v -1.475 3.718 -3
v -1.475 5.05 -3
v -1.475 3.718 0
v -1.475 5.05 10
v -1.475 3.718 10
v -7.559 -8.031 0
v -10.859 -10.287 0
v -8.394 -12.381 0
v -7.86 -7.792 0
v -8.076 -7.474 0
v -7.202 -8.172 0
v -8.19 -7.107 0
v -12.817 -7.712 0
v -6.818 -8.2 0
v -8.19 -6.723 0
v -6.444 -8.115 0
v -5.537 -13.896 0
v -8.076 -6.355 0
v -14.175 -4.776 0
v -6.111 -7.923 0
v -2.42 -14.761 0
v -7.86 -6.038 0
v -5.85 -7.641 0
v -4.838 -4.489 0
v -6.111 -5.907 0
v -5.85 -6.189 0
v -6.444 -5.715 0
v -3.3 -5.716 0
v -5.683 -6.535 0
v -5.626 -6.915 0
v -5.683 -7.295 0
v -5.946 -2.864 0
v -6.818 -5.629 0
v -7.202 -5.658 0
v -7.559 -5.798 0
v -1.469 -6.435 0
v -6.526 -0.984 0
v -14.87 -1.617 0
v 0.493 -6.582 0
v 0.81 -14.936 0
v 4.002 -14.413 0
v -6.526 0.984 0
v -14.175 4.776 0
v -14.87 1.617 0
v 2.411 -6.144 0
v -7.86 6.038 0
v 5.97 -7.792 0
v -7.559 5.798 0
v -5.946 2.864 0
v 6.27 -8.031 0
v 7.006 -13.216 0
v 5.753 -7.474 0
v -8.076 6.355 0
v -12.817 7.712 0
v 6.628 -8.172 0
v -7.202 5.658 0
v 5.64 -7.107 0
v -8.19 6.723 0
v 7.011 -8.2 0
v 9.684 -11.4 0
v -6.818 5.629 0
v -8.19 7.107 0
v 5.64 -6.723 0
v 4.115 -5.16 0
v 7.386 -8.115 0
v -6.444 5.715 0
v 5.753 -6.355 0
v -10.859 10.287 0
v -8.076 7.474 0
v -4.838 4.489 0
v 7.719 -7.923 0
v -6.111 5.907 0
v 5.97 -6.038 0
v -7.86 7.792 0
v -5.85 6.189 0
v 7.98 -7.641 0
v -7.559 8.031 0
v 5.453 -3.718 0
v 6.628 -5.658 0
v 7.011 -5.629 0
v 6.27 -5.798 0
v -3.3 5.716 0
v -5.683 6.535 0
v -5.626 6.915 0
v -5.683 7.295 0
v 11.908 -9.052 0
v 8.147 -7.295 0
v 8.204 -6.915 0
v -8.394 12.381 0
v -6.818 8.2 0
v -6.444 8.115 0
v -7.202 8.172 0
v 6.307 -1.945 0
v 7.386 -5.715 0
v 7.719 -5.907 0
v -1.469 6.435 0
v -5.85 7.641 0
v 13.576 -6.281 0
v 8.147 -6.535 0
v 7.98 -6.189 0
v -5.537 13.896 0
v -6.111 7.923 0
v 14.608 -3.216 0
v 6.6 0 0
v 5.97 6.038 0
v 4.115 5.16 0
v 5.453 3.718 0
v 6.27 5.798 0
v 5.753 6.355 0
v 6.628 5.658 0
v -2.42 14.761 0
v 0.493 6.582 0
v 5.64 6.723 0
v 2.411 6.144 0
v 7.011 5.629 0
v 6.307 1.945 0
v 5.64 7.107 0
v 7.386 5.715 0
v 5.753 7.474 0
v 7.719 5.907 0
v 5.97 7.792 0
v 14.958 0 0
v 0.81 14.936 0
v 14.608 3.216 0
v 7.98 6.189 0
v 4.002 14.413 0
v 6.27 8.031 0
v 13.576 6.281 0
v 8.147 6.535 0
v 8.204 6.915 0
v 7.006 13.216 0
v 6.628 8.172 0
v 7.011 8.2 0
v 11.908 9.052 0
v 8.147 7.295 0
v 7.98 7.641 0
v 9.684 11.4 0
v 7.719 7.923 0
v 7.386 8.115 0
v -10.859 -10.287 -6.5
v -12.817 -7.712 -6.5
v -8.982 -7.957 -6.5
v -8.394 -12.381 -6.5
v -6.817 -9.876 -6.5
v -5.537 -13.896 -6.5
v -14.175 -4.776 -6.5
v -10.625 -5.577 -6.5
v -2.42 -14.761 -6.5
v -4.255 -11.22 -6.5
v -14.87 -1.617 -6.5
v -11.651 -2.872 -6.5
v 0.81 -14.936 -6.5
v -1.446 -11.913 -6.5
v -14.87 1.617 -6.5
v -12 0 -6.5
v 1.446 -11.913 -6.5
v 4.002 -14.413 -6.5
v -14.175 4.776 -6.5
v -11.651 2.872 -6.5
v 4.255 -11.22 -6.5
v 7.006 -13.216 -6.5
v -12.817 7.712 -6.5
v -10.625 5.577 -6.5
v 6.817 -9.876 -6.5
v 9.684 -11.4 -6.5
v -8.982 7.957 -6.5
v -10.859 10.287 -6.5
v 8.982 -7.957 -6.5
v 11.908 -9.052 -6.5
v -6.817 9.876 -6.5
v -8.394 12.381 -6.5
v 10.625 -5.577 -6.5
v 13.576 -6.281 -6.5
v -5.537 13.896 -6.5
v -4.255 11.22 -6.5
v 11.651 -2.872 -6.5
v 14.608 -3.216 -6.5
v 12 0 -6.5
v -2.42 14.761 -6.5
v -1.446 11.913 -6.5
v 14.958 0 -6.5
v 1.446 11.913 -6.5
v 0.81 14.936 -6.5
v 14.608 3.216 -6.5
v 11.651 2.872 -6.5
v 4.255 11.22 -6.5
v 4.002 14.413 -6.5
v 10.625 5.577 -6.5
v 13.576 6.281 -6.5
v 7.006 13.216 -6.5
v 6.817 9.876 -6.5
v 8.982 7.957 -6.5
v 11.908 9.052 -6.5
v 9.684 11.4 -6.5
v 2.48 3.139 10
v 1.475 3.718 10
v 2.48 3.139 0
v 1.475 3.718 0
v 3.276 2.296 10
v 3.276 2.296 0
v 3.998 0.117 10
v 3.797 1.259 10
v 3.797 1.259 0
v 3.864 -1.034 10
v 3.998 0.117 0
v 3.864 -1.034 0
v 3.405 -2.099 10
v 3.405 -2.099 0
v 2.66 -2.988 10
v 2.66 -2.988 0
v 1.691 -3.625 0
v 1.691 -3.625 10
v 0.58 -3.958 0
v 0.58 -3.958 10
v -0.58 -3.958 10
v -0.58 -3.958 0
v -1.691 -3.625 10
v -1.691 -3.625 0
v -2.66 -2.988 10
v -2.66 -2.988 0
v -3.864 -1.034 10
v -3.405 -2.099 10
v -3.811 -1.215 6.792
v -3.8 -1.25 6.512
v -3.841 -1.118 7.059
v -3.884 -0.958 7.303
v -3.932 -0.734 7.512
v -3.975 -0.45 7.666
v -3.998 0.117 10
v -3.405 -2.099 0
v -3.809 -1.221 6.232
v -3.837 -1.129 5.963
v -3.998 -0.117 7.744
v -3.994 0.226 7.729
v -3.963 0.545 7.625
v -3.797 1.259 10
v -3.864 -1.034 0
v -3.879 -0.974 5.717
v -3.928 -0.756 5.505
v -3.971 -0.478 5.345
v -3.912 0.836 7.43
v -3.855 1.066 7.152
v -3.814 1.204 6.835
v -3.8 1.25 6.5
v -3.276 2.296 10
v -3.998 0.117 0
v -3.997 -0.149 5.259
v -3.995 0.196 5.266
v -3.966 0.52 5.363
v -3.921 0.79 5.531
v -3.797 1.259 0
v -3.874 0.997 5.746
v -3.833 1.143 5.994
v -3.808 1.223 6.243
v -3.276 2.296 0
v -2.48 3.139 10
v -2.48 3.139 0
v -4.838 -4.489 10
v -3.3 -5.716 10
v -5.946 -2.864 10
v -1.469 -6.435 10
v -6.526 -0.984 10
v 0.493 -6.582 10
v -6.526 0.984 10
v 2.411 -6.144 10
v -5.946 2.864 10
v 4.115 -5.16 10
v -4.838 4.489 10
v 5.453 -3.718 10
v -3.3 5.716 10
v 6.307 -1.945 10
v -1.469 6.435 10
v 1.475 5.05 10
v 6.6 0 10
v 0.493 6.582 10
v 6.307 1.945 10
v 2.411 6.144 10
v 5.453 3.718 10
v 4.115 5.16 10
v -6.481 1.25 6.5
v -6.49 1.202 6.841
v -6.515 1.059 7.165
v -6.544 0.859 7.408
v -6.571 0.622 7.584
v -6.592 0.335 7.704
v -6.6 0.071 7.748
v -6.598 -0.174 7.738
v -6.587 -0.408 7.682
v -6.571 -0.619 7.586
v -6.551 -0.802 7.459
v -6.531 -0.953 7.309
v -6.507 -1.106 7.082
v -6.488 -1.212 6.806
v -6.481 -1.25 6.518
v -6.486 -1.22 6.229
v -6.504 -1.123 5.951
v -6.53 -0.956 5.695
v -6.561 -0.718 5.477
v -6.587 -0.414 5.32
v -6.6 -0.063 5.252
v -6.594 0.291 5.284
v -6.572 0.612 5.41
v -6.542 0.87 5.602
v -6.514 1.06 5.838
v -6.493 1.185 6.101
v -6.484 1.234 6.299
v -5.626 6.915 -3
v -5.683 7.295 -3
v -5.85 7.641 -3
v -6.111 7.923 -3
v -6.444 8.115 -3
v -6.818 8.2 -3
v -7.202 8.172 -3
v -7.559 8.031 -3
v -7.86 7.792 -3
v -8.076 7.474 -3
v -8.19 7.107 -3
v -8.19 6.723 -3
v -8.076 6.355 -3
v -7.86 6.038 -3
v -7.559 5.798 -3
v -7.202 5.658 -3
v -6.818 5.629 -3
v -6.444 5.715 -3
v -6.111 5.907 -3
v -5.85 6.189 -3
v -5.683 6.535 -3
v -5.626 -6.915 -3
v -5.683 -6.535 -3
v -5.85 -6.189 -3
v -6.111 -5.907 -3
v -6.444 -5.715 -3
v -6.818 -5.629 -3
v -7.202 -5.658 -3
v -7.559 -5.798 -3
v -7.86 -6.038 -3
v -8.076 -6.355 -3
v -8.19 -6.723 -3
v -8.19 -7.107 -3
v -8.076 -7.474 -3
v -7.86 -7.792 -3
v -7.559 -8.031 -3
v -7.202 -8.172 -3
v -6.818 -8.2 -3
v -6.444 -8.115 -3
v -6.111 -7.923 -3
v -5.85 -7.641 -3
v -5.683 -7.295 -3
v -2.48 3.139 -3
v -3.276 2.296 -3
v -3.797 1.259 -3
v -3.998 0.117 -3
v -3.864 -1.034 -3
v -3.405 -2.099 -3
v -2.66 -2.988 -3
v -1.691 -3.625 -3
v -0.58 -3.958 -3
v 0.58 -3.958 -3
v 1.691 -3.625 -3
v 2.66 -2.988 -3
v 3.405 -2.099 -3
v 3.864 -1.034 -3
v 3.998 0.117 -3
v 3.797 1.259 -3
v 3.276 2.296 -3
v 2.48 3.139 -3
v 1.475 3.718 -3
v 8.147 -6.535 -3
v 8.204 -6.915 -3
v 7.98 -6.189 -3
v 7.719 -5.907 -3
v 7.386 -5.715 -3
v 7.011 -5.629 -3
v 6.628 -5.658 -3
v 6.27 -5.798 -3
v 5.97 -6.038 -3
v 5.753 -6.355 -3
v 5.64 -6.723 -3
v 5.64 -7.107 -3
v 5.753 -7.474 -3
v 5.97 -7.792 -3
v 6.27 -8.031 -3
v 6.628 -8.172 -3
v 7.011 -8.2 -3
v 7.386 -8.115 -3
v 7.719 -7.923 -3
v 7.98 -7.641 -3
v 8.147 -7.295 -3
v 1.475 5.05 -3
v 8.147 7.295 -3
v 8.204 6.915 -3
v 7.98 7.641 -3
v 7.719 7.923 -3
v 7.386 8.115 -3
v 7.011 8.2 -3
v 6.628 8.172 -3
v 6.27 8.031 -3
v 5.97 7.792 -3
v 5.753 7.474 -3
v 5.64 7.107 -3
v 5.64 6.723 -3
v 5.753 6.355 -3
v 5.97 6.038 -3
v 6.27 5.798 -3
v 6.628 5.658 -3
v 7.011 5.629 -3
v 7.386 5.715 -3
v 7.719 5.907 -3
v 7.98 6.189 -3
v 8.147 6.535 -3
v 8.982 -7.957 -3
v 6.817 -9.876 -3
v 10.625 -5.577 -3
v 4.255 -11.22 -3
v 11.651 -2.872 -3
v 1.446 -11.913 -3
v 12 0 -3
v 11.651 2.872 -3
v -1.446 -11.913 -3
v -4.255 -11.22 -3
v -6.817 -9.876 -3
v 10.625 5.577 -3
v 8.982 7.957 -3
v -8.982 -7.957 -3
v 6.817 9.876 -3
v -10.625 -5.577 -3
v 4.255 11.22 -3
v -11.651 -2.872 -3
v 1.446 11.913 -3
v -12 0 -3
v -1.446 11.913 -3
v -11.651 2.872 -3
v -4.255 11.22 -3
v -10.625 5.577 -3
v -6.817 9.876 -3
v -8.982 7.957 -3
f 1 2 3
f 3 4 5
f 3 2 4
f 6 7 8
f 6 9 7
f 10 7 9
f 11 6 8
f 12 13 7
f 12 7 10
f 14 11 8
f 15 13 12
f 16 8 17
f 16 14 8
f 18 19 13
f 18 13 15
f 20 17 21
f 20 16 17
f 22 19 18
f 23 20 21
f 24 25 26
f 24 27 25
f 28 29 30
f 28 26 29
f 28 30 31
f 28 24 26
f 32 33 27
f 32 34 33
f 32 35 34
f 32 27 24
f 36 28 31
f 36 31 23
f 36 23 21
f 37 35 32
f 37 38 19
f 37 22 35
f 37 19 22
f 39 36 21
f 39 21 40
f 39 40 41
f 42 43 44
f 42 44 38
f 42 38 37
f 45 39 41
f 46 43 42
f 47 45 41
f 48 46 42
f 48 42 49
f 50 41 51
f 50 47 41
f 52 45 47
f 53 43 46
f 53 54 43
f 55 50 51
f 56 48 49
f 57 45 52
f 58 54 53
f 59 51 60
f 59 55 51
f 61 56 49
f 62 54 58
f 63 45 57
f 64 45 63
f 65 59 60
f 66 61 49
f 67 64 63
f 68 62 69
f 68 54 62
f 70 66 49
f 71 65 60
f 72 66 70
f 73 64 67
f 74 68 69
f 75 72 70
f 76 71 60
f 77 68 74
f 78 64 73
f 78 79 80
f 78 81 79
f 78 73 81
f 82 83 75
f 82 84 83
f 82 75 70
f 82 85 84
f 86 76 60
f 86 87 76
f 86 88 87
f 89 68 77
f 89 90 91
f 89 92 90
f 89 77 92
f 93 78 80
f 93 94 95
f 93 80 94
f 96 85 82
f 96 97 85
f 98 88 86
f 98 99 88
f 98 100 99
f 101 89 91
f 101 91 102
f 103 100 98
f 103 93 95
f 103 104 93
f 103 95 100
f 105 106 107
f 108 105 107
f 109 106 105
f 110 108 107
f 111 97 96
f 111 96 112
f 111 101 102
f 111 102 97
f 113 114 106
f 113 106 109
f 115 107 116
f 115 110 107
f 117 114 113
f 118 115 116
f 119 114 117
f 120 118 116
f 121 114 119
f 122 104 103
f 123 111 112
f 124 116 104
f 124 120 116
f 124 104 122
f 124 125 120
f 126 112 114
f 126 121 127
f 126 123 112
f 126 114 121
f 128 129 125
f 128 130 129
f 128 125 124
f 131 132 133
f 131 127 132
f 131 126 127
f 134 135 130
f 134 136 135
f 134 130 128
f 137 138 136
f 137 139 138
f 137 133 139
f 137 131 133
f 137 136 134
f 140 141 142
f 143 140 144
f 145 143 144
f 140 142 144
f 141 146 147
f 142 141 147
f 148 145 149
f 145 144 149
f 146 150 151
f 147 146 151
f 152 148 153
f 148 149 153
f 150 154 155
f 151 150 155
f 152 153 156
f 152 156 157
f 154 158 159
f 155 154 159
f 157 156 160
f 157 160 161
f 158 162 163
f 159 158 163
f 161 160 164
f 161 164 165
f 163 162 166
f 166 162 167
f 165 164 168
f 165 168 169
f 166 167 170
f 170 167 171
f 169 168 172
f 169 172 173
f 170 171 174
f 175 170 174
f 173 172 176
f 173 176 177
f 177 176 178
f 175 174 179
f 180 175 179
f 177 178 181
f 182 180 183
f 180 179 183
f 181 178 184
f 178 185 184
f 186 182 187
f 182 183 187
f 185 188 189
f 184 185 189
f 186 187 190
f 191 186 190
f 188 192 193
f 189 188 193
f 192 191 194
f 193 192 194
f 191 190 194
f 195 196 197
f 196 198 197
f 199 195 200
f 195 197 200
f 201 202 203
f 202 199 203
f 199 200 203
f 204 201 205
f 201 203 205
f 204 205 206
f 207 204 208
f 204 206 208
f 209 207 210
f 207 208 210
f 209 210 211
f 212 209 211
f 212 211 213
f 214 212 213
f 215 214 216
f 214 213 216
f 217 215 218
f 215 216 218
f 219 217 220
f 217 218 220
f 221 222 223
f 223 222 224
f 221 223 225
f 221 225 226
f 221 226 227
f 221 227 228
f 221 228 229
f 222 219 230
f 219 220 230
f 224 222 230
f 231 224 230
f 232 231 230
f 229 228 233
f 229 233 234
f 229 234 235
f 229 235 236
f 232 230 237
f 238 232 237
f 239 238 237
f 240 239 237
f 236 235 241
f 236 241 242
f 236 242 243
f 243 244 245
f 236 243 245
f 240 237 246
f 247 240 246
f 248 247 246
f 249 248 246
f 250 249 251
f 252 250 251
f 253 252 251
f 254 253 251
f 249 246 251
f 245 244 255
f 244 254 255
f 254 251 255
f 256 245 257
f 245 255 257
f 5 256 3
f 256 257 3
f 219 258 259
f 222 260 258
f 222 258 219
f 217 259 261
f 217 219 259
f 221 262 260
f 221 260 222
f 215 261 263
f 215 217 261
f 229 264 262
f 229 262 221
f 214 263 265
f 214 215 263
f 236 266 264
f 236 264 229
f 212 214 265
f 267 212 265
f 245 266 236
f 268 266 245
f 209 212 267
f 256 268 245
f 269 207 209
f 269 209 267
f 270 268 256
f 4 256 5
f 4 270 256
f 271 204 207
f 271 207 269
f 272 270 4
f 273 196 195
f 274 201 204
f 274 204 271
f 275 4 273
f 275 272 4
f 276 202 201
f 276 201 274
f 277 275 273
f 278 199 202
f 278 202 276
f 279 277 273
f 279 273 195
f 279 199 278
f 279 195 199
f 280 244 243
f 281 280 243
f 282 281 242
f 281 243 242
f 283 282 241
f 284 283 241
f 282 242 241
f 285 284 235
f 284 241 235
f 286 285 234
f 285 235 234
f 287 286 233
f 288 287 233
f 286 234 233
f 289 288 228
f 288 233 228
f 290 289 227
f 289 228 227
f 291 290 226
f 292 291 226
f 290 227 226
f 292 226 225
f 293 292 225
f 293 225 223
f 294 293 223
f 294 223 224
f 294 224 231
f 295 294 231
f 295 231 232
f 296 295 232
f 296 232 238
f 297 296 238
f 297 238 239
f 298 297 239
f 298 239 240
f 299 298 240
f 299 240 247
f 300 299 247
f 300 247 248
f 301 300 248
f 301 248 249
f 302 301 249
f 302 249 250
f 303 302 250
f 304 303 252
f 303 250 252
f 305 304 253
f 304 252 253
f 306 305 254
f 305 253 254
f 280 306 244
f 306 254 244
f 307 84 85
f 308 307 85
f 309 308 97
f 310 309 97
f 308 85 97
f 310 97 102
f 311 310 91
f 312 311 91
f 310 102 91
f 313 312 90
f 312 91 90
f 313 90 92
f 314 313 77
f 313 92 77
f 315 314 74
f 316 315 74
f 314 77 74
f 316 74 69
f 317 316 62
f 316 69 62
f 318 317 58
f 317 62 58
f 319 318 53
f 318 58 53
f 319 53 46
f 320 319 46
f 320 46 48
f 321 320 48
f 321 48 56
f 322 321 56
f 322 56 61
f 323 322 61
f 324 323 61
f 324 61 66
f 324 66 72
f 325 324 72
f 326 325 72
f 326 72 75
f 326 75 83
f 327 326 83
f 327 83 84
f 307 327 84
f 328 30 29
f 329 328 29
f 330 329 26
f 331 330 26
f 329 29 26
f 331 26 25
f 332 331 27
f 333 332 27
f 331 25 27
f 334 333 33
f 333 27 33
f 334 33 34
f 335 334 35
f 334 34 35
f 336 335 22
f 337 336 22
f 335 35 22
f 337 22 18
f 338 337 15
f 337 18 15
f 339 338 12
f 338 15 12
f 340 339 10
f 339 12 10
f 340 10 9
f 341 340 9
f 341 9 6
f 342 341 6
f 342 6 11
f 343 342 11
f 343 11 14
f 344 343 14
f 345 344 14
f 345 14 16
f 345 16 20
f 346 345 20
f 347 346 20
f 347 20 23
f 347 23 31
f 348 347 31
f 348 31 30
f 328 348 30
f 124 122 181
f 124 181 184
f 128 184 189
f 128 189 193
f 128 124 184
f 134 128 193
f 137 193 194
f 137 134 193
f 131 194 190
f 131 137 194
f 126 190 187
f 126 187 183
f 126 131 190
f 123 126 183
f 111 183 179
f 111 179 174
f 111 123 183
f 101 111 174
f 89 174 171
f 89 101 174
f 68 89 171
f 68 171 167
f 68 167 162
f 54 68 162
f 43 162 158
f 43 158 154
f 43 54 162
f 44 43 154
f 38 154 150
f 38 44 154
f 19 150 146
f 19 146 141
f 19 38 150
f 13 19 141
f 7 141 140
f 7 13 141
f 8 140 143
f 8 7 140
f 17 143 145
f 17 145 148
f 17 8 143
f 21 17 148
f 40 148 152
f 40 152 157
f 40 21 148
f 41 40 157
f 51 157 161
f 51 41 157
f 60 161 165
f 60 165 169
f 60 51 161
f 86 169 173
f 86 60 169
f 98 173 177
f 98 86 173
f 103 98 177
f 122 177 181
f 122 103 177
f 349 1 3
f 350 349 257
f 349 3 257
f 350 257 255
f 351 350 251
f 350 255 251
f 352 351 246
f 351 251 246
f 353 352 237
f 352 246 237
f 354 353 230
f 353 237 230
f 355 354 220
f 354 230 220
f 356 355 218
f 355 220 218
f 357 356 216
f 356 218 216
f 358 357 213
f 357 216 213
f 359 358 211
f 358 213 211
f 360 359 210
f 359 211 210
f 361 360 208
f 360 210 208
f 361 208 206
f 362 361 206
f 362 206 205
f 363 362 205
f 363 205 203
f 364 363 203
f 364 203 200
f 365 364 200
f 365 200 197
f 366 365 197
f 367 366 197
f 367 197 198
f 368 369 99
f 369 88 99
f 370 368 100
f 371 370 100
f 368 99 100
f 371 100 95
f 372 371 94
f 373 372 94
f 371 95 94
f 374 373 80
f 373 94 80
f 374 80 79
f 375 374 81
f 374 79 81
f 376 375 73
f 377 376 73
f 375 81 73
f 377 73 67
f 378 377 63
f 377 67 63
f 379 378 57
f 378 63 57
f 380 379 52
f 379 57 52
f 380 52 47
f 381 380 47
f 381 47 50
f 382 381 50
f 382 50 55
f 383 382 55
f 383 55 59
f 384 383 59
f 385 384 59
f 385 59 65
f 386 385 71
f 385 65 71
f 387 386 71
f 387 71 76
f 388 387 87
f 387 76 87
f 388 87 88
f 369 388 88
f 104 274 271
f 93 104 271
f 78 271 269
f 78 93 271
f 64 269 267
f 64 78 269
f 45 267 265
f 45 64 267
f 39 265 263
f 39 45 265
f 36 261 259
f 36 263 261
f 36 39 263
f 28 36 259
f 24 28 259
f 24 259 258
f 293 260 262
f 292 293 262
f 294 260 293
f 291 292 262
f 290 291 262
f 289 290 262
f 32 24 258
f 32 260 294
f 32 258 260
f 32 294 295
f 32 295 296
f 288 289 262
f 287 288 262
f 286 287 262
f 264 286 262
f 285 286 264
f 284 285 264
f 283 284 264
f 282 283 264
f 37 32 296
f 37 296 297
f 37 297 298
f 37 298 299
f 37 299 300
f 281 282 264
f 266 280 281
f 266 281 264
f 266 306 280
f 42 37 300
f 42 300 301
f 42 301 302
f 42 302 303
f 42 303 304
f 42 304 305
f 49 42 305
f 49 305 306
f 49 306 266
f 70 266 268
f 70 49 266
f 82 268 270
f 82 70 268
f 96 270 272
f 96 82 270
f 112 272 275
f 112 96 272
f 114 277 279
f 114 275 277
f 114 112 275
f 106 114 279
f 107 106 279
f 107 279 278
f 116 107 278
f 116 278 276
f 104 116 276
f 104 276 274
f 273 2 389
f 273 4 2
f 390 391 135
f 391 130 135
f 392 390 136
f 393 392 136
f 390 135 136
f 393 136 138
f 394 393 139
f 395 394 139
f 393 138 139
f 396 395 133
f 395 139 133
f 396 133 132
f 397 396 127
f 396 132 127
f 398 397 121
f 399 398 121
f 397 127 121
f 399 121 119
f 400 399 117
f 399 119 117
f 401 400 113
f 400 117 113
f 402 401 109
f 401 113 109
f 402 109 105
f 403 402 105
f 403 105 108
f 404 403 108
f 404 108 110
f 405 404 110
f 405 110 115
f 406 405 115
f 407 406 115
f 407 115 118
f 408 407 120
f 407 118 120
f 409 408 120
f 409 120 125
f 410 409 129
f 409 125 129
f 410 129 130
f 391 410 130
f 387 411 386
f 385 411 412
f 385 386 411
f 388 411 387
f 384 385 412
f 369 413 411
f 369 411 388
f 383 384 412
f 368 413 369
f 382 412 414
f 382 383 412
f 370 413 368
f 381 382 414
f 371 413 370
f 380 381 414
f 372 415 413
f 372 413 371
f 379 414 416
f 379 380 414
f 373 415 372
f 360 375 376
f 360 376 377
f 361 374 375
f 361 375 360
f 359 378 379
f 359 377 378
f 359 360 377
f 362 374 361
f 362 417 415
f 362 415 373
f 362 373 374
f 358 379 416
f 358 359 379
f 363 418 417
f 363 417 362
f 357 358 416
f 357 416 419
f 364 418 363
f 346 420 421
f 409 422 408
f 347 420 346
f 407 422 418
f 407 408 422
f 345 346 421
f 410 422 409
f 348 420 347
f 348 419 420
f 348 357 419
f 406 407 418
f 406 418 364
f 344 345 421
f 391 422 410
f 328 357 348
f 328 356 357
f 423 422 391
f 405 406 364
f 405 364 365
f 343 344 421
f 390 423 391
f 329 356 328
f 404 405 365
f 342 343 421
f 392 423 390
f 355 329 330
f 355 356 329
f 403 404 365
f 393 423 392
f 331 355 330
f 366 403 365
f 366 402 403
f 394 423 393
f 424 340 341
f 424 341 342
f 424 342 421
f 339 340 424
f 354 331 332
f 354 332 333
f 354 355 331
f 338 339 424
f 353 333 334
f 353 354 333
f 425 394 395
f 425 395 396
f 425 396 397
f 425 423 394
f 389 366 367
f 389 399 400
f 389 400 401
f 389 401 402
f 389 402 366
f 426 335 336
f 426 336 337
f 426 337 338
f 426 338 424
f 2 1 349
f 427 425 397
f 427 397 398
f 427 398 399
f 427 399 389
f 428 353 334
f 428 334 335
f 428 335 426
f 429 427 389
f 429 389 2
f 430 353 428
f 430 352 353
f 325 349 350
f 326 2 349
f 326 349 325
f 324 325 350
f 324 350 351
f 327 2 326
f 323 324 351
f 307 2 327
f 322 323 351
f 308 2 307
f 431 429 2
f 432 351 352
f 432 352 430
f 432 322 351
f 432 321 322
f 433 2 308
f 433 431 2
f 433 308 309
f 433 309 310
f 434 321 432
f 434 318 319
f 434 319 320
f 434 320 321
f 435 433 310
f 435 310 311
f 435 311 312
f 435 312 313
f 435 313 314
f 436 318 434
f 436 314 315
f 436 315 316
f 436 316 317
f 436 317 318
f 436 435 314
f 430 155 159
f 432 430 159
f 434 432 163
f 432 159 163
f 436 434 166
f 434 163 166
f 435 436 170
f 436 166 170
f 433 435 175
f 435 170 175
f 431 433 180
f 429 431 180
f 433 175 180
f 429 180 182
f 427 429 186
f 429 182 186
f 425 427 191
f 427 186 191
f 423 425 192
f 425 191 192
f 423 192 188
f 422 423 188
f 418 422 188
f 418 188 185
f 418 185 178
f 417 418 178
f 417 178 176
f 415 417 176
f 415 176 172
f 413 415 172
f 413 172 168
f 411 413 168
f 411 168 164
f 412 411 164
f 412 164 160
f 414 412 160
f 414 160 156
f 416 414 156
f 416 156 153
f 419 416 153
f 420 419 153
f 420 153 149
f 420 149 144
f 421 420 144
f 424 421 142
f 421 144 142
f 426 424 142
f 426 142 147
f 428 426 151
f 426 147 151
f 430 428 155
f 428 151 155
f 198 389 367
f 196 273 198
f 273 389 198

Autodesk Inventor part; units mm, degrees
ref_plane "YZ Plane" through (0, 0, 0) normal (1, 0, 0) x (0, 1, 0)
ref_plane "XZ Plane" through (0, 0, 0) normal (0, 1, 0) x (-1, 0, 0)
ref_plane "XY Plane" through (0, 0, 0) normal (0, 0, 1) x (1, 0, 0)
sketch "Sketch1" plane through (0, 0, 0) normal (0, 0, 1) x (1, 0, 0)
  circle A0 centre (0, 0) radius 6.6 construction
  circle A1 centre (-6.9148, 6.9148) radius 1.5875 construction
  circle A2 centre (6.9148, 6.9148) radius 1.5875 construction
  circle A3 centre (-6.9148, -6.9148) radius 1.5875 construction
  circle A4 centre (6.9148, -6.9148) radius 1.5875 construction
  line L0 (-6.9148, 6.9148) -> (6.9148, 6.9148) construction
  line L1 (6.9148, 6.9148) -> (6.9148, -6.9148) construction
  line L2 (6.9148, -6.9148) -> (-6.9148, -6.9148) construction
  line L3 (-6.9148, -6.9148) -> (-6.9148, 6.9148) construction
  circle A5 centre (0, 0) radius 12.958 construction
  line L4 (-6.9148, -6.9148) -> (6.9148, 6.9148) construction
  line L5 (-6.9148, 6.9148) -> (-5.7923, 5.7923) construction
  line L6 (-5.7923, 5.7923) -> (-4.6669, 4.6669) construction
  line L7 (-8.0373, 8.0373) -> (-9.1627, 9.1627) construction
  circle A6 centre (0, 0) radius 4
  line L8 (0, 4) -> (0, 5.05) construction
  line L9 (0, -20.9412) -> (0, 20.9412) construction
  line L10 (-1.475, 5.05) -> (1.475, 5.05)
  line L11 (-1.475, 5.05) -> (-1.475, 3.7181)
  line L12 (1.475, 5.05) -> (1.475, 3.7181)
  circle A7 centre (0, 0) radius 14.958
  circle A8 centre (6.9148, 6.9148) radius 1.2891
  circle A9 centre (6.9148, -6.9148) radius 1.2891
  circle A10 centre (-6.9148, -6.9148) radius 1.2891
  circle A11 centre (-6.9148, 6.9148) radius 1.2891
  dimension "d0" = 13.2
  dimension "d1" = 3.175
  dimension "d5" = 13.8296
  dimension "d6" = 45
  dimension "d9" = 8
  dimension "d10" = 1.05
  dimension "d11" = 2.95
  dimension "d14" = 2
  dimension "d15" = 29.916
  dimension "d21" = 2.5781
extrude "HubFeature" add sketch "Sketch1" against normal blind 6.5
sketch "Sketch2" plane through (0, 0, 0) normal (0, 0, 1) x (1, 0, 0)
  circle A0 centre (0, 0) radius 6.6 projected
  line L0 (-1.475, 5.05) -> (1.475, 5.05) projected
  line L1 (-1.475, 3.7181) -> (-1.475, 5.05) projected
  line L2 (1.475, 5.05) -> (1.475, 3.7181) projected
  arc A1 (-1.475, 3.7181) -> (1.475, 3.7181) centre (0, 0) ccw projected
extrude "LipFeature" add sketch "Sketch2" along normal blind 10
sketch "Sketch3" plane through (0, 0, -6.5) normal (0, 0, -1) x (-1, 0, 0)
  circle A0 centre (0, 0) radius 12
  dimension "d18" = 24
extrude "BearingIndentFeature" cut sketch "Sketch3" against normal blind 3.5
sketch "SetScrewHole" plane through (0, 0, 0) normal (1, 0, 0) x (0, 1, 0)
  line L0 (6.6, 10) -> (-6.6, 10) construction
  line L1 (-6.6, 0) -> (6.6, 0) construction
  line L2 (-4, 10) -> (3.7181, 10) construction
  circle A0 centre (0, 6.5) radius 1.25
  line L3 (0, 10) -> (0, 0) construction
  line L4 (14.958, 0) -> (-14.958, 0) projected
  dimension "d22" = 2.5
  dimension "d25" = 3.5
extrude "SetScrewHoleFeature" cut sketch "SetScrewHole" against normal through all
properties part number "BaseHub"
